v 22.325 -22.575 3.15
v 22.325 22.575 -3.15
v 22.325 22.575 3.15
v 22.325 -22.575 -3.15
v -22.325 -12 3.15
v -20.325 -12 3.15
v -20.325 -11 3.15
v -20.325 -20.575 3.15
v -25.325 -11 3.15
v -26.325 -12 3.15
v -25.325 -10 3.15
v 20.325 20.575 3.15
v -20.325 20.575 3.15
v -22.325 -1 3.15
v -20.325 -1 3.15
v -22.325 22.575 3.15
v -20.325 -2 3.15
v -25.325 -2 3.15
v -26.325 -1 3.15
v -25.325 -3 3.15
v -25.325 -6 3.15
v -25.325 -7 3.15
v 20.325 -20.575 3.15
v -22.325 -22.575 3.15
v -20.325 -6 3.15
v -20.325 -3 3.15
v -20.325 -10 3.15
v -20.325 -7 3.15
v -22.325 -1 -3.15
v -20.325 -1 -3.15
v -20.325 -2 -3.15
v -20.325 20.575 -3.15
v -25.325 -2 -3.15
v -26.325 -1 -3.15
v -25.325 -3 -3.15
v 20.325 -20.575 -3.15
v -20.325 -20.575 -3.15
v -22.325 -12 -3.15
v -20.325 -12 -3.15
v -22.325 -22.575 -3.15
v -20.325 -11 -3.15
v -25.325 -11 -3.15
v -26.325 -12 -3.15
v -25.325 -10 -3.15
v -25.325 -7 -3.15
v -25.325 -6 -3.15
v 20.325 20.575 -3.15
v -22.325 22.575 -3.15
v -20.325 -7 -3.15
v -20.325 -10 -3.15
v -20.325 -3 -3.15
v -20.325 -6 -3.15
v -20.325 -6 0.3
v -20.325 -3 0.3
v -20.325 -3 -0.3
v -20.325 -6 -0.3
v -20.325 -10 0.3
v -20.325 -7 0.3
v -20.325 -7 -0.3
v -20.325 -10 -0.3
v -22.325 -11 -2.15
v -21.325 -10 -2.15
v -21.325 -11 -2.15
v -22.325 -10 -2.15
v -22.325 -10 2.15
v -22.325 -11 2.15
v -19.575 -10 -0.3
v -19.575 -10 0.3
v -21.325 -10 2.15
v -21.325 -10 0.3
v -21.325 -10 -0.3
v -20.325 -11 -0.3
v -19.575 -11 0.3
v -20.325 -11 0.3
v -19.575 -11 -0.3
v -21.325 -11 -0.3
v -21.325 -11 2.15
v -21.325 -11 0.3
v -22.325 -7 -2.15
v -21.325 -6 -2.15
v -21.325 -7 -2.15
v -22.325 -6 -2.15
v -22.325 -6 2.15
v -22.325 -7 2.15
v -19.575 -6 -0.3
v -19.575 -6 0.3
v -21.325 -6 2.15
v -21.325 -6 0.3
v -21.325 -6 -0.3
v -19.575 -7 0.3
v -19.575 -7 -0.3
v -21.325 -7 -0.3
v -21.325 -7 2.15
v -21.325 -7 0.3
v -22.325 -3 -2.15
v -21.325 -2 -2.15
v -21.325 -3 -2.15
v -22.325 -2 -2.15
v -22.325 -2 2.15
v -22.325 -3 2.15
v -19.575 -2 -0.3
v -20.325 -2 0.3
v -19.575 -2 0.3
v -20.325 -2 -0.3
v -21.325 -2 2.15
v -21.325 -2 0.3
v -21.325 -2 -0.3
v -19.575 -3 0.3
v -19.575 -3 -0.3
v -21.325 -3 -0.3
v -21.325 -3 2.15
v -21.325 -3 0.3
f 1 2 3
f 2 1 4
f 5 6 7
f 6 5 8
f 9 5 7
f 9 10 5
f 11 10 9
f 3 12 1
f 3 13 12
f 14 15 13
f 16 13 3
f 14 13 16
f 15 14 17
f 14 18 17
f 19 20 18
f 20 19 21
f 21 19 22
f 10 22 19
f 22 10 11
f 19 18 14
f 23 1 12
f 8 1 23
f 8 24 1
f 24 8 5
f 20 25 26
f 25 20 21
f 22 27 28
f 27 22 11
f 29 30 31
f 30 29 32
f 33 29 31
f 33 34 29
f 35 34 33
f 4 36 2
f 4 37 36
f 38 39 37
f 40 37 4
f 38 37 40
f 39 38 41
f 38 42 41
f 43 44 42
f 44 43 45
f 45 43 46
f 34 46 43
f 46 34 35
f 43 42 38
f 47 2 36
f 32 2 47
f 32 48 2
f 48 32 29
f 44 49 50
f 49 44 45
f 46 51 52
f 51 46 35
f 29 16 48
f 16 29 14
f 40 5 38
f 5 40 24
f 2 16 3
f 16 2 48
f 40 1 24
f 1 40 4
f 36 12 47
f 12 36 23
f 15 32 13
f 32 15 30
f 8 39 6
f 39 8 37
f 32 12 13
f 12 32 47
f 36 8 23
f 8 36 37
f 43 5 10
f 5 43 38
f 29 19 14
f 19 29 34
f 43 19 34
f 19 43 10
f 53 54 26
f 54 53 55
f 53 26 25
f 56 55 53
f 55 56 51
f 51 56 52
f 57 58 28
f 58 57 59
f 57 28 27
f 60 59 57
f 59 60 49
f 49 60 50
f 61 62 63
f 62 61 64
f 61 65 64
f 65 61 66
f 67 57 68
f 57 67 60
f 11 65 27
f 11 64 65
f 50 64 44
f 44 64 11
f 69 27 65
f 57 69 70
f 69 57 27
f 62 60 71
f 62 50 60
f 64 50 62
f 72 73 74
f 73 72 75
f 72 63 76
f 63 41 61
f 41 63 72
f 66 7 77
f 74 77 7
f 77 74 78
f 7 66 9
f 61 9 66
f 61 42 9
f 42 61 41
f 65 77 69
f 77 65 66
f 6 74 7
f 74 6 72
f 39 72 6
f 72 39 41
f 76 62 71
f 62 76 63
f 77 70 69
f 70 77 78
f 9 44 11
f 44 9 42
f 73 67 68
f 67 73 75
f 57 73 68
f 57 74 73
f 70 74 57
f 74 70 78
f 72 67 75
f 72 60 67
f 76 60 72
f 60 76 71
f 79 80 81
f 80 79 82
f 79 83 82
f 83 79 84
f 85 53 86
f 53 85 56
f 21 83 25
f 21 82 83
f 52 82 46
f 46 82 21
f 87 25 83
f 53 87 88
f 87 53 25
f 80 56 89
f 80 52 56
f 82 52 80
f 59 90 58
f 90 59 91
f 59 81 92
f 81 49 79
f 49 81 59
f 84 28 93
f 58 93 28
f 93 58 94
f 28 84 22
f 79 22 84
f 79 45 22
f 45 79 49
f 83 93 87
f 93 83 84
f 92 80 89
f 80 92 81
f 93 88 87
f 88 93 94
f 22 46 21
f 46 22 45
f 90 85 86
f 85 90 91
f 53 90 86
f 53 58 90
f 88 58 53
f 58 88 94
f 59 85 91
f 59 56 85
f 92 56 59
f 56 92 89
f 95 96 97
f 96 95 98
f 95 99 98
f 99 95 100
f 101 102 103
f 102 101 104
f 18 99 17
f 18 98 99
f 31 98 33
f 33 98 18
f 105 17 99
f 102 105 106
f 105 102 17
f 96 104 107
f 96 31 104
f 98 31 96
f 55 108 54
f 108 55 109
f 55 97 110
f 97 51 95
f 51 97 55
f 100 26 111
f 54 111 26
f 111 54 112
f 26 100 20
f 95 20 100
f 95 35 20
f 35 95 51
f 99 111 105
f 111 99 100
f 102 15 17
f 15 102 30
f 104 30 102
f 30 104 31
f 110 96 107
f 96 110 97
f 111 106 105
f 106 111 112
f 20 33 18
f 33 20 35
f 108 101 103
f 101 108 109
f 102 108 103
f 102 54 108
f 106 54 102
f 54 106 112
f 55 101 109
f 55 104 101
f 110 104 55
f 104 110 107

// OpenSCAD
/*
 * atreus_bluetooth
 * Copyright (C) 2015 cy384
 *
 * This program is free software: you can redistribute it and/or modify
 * it under the terms of the GNU General Public License as published by
 * the Free Software Foundation, either version 3 of the License, or
 * (at your option) any later version.
 *
 * This program is distributed in the hope that it will be useful,
 * but WITHOUT ANY WARRANTY; without even the implied warranty of
 * MERCHANTABILITY or FITNESS FOR A PARTICULAR PURPOSE.  See the
 * GNU General Public License for more details.

 * You should have received a copy of the GNU General Public License
 * along with this program.  If not, see <http://www.gnu.org/licenses/>.
 */

// size of battery
// fudge these until you get a nice friction fit
batt_x = 40.65;
batt_y = 41.15;
batt_z = 06.30;

// thickness of perimeter wall
perimeter = 2;

// where to put the contacts
contact_location = [-((batt_x + 6)/2), -6.5, 0];

module holder_body()
{
	difference()
	{
		cube([batt_x + perimeter*2, batt_y + perimeter*2, batt_z], center=true);
		cube([batt_x, batt_y, batt_z], center=true);
	}
}

module contact()
{
	difference()
	{
		cube([6, 3, batt_z], center=true);
		translate([2.5, 0, 0]) cube([1, 1, batt_z], center=true);
		translate([-0.5, 0, 0]) cube([3, 1, batt_z], center=true);

		for (i= [-1, 1])
		{
			translate([2, 0, i*batt_z/2]) cube([2, 1, 2], center=true);
		}
	}
	
	translate([2.5, 0, 0]) cube([2.5, 1, 0.6], center=true);
}

module contact_block()
{
	c1 = -4;
	c2 = 0;
	c3 = +4;

	difference()
	{
		cube([6, (c3 - c1) + 2, batt_z], center=true);

		for (i = [c1, c2, c3])
		{
			translate([0, i, 0]) hull() contact();
		}
	}

	for (i = [c1, c2, c3])
	{
		translate([0, i, 0]) contact();
	}
}

module battery_holder()
{
	difference()
	{
		holder_body();
		translate(contact_location) hull() contact_block();
	}

	translate(contact_location) contact_block();
}

battery_holder();
